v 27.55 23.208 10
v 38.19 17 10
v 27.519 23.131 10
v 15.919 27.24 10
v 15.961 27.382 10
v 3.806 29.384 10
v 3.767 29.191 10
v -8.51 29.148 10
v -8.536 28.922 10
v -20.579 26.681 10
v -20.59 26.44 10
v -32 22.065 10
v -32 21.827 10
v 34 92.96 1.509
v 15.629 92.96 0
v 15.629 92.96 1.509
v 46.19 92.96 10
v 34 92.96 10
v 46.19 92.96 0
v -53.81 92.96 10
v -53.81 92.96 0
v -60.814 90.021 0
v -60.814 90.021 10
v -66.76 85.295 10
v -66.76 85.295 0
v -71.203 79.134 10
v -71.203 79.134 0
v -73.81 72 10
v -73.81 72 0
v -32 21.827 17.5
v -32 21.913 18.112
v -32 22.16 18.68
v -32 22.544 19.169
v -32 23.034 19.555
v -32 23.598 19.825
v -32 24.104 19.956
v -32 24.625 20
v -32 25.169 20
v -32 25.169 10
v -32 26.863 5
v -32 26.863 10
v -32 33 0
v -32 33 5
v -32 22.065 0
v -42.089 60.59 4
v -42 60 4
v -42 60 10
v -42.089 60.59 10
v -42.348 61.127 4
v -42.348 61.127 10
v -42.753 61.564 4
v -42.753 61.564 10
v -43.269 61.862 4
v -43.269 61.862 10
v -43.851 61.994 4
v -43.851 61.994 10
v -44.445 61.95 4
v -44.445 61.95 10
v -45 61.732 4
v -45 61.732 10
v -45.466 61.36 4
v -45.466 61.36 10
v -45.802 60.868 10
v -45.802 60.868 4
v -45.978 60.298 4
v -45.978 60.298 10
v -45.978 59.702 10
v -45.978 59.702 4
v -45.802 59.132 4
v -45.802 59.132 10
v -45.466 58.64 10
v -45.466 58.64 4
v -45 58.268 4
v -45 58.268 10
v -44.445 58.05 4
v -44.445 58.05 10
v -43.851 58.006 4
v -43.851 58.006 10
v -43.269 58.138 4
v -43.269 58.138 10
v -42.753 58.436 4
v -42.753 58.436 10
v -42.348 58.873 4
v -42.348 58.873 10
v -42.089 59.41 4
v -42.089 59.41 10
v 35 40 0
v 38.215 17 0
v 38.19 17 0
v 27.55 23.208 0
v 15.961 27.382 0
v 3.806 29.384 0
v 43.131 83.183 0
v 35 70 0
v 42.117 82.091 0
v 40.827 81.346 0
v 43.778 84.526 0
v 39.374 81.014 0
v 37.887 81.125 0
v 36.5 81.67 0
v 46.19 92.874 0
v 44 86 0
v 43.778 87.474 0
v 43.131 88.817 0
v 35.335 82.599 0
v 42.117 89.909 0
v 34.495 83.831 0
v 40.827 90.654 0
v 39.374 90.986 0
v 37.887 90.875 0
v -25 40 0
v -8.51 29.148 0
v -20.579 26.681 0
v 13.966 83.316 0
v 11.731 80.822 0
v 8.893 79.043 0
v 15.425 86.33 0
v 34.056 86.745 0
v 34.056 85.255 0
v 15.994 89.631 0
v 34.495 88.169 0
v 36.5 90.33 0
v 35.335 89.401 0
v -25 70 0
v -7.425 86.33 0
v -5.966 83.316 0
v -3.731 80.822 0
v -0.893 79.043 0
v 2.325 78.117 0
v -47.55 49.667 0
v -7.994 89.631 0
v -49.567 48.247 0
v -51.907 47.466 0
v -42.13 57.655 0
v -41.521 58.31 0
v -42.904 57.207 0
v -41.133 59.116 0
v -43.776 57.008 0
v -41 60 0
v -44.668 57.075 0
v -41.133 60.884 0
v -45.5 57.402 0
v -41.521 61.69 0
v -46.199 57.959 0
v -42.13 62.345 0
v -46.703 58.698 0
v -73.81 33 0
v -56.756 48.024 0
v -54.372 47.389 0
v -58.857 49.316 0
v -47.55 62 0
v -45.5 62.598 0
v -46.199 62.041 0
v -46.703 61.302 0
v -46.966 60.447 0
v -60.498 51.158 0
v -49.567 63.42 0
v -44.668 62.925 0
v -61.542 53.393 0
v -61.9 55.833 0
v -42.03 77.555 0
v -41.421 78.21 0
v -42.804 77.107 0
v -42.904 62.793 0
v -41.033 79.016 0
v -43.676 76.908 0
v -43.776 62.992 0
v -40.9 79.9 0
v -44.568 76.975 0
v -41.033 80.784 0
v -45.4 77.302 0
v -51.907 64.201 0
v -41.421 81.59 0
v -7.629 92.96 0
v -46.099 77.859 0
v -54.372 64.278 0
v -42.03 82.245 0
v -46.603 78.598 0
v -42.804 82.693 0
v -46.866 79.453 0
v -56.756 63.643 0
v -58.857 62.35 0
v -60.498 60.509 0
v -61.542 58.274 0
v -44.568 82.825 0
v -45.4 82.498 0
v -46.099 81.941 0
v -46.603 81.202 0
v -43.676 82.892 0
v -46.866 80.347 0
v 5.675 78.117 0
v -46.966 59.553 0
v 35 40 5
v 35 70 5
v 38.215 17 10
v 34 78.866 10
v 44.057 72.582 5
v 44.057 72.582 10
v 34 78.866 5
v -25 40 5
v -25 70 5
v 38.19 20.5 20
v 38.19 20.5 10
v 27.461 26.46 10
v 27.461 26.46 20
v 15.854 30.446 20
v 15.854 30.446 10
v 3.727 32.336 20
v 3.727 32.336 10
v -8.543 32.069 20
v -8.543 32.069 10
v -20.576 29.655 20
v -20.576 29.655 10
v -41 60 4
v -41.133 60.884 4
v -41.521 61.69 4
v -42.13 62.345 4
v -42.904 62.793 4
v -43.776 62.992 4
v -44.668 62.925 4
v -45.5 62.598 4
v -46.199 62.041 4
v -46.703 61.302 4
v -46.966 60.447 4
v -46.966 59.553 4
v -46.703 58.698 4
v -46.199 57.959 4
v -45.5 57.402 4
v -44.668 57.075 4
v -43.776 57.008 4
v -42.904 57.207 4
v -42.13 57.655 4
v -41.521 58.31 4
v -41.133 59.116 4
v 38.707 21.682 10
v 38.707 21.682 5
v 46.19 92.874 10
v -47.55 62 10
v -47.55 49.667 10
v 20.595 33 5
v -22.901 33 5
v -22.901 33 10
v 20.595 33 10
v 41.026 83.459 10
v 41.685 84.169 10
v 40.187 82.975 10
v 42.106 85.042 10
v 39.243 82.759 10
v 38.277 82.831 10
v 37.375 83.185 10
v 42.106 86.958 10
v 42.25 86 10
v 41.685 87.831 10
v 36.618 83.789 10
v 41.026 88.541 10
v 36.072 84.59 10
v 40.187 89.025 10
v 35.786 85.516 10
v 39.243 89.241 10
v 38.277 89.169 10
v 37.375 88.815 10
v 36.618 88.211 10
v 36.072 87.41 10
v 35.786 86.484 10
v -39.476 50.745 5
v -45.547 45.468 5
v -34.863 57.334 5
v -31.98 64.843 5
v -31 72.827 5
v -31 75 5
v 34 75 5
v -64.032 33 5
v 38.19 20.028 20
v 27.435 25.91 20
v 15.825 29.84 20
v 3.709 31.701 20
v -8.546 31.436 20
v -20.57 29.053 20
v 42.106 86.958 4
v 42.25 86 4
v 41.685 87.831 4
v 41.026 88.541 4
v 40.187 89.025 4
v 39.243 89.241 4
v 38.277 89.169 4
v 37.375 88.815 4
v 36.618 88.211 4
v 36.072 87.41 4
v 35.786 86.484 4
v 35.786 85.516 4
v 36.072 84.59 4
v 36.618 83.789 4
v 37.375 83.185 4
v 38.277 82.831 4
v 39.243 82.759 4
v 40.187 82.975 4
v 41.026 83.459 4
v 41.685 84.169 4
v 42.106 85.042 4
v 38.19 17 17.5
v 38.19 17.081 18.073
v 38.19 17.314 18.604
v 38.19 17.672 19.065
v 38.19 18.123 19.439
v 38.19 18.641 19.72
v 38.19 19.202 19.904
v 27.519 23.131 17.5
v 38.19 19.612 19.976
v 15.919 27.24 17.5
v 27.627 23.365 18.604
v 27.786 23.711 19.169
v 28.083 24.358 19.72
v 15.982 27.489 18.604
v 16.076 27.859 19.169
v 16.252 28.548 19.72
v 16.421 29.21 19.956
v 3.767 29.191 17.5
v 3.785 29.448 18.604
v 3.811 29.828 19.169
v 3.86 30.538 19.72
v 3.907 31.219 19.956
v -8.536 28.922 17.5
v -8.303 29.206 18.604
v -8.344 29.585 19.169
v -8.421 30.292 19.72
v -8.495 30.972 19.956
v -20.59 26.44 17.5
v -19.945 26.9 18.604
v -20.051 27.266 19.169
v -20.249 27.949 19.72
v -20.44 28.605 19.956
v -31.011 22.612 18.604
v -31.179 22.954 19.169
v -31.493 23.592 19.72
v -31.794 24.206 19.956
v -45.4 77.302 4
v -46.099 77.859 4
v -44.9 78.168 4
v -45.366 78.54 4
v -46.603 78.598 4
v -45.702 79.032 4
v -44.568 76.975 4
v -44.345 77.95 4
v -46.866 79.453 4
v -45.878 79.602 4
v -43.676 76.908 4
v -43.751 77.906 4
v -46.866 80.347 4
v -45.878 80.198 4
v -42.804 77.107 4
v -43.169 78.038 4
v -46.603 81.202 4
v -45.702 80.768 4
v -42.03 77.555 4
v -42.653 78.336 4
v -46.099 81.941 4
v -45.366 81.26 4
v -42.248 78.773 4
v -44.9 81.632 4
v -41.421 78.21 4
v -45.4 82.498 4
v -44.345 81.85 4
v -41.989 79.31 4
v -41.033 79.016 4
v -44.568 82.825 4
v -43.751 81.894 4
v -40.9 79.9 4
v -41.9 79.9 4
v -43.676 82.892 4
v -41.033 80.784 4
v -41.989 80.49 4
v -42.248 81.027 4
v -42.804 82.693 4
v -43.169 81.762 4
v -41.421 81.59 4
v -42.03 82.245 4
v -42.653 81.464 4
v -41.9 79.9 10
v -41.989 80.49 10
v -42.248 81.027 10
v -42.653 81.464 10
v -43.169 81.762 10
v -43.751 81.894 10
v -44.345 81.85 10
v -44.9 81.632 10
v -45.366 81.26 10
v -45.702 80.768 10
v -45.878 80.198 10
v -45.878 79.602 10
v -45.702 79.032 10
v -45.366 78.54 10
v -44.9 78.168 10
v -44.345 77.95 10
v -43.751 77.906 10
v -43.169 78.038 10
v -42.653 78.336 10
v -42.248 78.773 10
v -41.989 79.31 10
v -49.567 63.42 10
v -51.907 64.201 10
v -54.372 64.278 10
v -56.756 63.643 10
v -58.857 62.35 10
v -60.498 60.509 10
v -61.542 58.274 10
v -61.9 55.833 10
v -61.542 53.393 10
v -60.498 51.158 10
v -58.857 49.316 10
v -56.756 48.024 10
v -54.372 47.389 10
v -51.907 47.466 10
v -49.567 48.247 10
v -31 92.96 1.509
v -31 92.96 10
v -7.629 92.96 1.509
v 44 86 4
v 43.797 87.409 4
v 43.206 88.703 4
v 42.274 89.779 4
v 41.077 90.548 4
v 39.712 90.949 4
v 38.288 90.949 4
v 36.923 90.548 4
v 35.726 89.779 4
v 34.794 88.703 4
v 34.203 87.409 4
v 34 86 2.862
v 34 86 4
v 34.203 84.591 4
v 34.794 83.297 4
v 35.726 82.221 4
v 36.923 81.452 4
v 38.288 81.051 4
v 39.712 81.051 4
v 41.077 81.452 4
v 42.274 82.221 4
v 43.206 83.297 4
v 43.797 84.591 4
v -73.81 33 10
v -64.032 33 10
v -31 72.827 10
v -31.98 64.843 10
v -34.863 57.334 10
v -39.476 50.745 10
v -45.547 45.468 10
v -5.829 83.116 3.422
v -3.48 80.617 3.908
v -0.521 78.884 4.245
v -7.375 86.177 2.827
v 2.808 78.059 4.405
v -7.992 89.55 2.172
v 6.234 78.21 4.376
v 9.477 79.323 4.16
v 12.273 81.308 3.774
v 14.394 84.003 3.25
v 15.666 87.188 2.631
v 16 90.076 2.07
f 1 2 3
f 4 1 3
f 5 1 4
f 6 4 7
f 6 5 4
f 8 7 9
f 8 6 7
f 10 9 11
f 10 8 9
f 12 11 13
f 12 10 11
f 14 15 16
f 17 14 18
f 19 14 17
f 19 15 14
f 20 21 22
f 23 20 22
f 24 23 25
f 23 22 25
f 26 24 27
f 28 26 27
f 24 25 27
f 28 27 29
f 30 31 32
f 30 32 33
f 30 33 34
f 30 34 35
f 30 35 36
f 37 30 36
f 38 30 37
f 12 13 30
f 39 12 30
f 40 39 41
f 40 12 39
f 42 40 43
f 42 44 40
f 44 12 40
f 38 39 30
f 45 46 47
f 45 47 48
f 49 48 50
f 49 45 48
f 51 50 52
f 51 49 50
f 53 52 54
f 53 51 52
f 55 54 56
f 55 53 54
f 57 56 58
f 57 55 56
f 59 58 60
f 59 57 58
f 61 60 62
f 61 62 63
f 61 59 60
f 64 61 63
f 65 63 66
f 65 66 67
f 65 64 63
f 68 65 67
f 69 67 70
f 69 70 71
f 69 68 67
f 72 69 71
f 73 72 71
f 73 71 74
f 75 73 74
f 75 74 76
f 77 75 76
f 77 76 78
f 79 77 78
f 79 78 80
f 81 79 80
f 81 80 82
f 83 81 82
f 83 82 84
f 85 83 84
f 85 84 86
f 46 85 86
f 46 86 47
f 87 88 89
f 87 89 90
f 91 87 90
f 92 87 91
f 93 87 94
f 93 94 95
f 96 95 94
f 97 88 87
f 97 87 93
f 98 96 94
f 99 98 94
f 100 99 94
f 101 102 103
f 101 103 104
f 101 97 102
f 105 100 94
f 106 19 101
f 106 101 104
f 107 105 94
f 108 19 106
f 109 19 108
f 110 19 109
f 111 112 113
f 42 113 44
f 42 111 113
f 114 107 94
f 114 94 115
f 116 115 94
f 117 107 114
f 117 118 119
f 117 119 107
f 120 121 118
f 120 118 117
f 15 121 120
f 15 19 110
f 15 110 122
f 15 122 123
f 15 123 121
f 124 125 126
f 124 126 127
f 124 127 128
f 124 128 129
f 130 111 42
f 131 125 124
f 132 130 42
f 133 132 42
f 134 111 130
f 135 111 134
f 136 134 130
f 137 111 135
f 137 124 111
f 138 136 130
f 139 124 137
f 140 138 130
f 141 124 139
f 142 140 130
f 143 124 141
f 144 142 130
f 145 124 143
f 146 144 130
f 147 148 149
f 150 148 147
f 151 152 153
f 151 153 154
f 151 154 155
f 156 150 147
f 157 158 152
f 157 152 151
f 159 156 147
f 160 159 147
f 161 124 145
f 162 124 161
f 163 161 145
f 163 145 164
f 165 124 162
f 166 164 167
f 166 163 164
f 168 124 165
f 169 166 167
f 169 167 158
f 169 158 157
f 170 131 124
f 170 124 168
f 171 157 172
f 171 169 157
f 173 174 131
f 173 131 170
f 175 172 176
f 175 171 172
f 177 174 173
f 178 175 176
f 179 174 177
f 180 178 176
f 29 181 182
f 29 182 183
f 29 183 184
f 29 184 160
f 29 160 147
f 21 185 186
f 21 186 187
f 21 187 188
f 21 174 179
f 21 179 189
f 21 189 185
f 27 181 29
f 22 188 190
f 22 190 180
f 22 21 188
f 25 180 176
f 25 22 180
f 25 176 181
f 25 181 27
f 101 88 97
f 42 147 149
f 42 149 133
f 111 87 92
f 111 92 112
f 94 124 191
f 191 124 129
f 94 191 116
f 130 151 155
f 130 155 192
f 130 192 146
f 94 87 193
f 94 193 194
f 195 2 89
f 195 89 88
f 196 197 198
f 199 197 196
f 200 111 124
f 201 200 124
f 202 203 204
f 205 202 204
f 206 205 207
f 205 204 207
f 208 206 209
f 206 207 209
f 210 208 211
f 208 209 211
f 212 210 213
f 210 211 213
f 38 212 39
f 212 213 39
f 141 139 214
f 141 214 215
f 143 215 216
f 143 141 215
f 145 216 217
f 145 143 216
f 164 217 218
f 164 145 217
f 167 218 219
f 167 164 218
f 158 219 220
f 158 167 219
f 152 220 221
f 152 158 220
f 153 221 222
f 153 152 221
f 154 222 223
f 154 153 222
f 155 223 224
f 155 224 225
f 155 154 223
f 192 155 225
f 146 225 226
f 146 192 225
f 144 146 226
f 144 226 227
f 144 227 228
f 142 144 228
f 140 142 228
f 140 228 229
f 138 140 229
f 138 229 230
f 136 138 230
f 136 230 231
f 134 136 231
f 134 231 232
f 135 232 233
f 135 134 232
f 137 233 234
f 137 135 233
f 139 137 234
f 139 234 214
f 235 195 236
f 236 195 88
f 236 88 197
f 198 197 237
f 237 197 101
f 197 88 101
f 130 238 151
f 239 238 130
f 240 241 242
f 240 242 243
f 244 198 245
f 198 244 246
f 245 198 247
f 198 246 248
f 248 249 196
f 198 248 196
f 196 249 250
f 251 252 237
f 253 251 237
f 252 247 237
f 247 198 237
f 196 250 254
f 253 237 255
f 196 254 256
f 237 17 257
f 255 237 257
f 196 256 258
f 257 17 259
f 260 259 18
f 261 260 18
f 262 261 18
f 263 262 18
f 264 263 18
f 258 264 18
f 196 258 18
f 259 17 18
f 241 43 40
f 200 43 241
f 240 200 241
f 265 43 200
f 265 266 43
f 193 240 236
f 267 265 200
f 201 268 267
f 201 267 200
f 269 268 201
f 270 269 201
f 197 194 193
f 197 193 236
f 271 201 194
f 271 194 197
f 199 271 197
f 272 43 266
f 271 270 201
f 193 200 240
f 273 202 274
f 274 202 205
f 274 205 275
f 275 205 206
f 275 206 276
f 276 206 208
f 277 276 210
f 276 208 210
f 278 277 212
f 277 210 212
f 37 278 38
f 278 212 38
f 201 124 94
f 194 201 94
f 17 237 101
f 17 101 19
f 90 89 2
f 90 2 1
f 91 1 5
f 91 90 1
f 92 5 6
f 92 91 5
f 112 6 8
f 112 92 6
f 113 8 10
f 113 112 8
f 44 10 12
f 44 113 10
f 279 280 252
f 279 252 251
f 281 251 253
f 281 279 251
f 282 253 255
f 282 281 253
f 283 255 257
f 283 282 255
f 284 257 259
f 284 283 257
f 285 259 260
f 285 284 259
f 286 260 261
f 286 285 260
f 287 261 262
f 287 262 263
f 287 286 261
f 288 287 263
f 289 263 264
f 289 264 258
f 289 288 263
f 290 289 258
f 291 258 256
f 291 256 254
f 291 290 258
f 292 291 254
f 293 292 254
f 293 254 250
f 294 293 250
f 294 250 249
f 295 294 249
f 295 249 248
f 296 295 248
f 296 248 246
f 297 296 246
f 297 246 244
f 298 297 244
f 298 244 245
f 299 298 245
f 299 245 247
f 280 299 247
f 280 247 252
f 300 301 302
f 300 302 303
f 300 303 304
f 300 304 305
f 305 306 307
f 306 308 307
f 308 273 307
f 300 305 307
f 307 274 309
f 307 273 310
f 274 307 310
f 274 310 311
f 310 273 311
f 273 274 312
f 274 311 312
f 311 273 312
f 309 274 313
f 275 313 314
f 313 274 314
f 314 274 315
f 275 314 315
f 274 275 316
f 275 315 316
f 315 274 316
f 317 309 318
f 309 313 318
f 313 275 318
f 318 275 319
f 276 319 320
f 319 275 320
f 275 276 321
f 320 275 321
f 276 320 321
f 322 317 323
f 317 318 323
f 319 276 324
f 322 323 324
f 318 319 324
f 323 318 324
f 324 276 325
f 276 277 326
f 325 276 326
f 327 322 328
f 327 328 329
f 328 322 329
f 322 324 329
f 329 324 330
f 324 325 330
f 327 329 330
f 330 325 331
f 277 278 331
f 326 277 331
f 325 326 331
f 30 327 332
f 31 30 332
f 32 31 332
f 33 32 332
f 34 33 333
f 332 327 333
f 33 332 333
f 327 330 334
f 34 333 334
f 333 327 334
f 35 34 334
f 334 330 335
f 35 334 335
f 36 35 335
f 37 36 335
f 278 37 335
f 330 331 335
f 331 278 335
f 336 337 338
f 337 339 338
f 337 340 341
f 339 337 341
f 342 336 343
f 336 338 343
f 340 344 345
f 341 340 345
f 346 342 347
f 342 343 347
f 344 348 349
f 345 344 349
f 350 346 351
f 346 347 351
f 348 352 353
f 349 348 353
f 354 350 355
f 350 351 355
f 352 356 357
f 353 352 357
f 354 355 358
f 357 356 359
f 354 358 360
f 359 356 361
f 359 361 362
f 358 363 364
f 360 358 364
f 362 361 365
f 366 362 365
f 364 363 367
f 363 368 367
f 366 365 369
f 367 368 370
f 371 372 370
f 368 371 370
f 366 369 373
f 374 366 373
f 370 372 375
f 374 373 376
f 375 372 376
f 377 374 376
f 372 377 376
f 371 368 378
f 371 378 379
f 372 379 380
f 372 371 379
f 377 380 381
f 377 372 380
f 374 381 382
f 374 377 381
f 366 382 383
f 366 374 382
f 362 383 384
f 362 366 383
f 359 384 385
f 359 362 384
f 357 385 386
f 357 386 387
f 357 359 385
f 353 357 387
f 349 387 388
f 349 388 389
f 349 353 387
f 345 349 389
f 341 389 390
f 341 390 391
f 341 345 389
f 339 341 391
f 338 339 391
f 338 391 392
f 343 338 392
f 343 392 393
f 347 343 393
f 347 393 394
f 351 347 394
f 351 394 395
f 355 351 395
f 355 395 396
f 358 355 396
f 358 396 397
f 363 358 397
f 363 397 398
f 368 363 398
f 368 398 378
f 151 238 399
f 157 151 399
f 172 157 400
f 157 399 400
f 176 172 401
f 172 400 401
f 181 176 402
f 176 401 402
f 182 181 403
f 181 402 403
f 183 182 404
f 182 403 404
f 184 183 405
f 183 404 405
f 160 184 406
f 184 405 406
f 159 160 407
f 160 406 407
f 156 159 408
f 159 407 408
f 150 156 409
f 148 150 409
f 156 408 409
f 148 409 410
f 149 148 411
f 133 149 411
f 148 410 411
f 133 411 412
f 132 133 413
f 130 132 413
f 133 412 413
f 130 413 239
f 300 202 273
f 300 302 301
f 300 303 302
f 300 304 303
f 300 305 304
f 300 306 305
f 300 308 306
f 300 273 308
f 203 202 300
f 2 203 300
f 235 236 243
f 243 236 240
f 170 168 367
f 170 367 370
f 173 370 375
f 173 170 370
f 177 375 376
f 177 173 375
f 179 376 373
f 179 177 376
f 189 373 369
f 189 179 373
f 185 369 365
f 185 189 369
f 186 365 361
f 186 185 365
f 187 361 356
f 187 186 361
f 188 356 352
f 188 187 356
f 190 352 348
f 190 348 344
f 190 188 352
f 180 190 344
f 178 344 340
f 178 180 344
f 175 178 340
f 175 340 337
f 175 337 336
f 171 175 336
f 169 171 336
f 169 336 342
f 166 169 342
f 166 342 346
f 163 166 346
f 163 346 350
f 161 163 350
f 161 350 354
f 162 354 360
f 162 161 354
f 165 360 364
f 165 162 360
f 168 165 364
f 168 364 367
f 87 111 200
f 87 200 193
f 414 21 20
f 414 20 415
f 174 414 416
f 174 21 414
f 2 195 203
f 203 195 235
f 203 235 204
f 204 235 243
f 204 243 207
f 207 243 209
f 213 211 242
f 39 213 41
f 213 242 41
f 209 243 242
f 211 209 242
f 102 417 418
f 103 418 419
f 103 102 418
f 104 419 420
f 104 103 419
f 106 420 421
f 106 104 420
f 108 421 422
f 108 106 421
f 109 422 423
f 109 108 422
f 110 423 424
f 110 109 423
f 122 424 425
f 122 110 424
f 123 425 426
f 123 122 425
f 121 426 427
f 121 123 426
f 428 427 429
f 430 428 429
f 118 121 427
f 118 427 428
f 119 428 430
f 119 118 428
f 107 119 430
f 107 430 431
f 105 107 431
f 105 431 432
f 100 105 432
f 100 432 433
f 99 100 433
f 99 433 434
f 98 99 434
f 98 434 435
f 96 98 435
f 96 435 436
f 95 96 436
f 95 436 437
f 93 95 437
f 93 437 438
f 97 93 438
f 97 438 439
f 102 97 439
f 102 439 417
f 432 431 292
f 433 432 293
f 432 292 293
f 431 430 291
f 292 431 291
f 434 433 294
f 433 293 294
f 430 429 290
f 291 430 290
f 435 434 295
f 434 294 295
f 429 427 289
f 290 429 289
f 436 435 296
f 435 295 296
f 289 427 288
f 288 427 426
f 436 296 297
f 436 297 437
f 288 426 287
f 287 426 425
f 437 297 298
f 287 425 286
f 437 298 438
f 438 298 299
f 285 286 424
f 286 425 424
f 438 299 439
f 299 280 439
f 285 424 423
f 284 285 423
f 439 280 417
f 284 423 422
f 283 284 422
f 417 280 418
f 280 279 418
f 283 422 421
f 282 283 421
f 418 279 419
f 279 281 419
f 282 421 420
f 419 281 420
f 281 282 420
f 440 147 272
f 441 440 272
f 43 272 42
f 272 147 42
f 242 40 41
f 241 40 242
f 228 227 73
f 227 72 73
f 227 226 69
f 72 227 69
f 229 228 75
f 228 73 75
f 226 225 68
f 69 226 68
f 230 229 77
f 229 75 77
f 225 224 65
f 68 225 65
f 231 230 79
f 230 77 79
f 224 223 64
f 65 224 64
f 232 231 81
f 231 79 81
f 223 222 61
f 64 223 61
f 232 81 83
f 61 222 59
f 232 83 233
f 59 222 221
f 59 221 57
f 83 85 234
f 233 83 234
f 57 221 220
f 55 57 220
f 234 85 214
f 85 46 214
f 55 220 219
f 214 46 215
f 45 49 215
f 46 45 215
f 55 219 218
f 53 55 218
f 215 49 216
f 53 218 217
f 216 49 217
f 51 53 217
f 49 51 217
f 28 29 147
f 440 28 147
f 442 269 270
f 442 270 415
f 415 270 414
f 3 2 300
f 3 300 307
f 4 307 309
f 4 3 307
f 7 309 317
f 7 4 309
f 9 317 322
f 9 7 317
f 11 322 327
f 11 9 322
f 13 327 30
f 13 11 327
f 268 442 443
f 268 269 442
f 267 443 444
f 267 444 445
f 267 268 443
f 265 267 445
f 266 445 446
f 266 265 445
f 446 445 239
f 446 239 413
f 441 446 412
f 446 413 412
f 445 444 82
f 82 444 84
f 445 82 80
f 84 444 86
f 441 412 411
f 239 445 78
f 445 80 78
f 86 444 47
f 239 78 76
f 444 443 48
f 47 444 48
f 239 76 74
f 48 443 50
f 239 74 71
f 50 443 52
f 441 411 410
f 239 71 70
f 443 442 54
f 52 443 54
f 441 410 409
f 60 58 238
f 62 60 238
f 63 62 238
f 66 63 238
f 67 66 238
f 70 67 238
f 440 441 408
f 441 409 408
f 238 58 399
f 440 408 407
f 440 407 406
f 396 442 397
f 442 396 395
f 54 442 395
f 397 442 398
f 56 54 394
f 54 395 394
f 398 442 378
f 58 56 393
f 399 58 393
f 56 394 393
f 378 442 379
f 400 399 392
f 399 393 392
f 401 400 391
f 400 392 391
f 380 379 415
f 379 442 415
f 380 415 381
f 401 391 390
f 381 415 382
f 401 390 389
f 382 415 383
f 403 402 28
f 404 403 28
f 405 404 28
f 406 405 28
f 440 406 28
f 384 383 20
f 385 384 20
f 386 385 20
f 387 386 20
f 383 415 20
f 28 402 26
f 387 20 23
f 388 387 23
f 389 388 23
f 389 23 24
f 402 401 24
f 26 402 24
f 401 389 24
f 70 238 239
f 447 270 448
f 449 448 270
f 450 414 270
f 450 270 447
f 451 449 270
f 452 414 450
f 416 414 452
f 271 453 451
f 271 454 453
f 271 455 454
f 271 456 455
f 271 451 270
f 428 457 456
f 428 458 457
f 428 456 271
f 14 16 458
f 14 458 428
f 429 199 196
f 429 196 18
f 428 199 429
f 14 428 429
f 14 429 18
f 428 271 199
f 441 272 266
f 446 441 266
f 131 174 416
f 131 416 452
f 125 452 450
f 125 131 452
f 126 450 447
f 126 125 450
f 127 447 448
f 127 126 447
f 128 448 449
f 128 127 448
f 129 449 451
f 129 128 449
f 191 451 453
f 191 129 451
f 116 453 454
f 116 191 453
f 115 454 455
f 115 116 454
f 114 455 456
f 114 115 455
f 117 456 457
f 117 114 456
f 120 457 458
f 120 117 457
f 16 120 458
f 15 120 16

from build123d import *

# Parameters (mm, degrees)
PAD002_DEPTH      = 10
PAD003_DEPTH      = 10
FILLET_R          = 2.5
BOX013_W          = 42
BOX013_H          = 20
BOX013_DEPTH      = 20
CYLINDER009_R     = 12
CYLINDER009_DEPTH = 10
CYLINDER010_R     = 5
CYLINDER010_DEPTH = 4
CYLINDER011_R     = 3.25
CYLINDER011_DEPTH = 10
CYLINDER012_R     = 2
CYLINDER012_DEPTH = 10
CYLINDER013_R     = 2
CYLINDER013_DEPTH = 10
CYLINDER014_R     = 3
CYLINDER014_DEPTH = 4
CYLINDER015_R     = 3
CYLINDER015_DEPTH = 4
BOX014_W          = 83
BOX014_H          = 10
BOX014_DEPTH      = 10
BOX015_W          = 60
BOX015_H          = 30
BOX015_DEPTH      = 10
BOX016_W          = 65
BOX016_H          = 62
BOX016_DEPTH      = 10
BOX017_W          = 47
BOX017_H          = 23
BOX017_DEPTH      = 5
BOX018_W          = 46
BOX018_H          = 40
BOX018_DEPTH      = 5
BOX019_W          = 65
BOX019_H          = 22
BOX019_DEPTH      = 10
FILLET001_R       = 33
POCKET_DEPTH      = 10


with BuildPart() as part:
    # Sketch012 → Pad002 (new body)
    with BuildSketch(Plane.XY):
        with BuildLine():
            Line((-53.81, 92.96), (46.19, 92.96))
            Line((46.19, 17), (46.19, 92.96))
            Line((38.19, 17), (46.19, 17))
            ThreePointArc((38.19, 17), (-1.06, 29.559572), (-40.31, 17))
            Line((-73.81, 17), (-40.31, 17))
            Line((-73.81, 72), (-73.81, 17))
            ThreePointArc((-53.81, 92.96), (-66.759872, 85.294763), (-73.81, 72))
        make_face()
    extrude(amount=PAD002_DEPTH)

    # Sketch013 (on Face9 of Pad002) → Pad003 (join)
    with BuildSketch(Plane.XY.offset(10)):
        with BuildLine():
            ThreePointArc((38.19, 17), (-0.906062, 29.351664), (-40, 16.993281))
            Line((-40, 20.493281), (-40, 16.993281))
            ThreePointArc((38.19, 20.5), (-0.906031, 32.489323), (-40, 20.493281))
            Line((38.19, 20.5), (38.19, 17))
        make_face()
    extrude(amount=PAD003_DEPTH)

    # Fillet
    fillet_edges = [part.edges().sort_by_distance(p)[0] for p in [
        (-0.906062, 29.351664, 20),
    ]]
    fillet(fillet_edges, radius=FILLET_R)

    # Box013 → Box013 (cut)
    with BuildSketch(Plane(origin=(-74, 13, 0), x_dir=(1, 0, 0), z_dir=(0, 0, 1))):
        with Locations((21, 10)):
            Rectangle(BOX013_W, BOX013_H)
    extrude(amount=BOX013_DEPTH, mode=Mode.SUBTRACT)

    # Cylinder009 → Cylinder009 (cut)
    with BuildSketch(Plane(origin=(4, 90, 0), x_dir=(1, 0, 0), z_dir=(0, 0, 1))):
        Circle(CYLINDER009_R)
    extrude(amount=CYLINDER009_DEPTH, mode=Mode.SUBTRACT)

    # Cylinder010 → Cylinder010 (cut)
    with BuildSketch(Plane(origin=(39, 86, 0), x_dir=(1, 0, 0), z_dir=(0, 0, 1))):
        Circle(CYLINDER010_R)
    extrude(amount=CYLINDER010_DEPTH, mode=Mode.SUBTRACT)

    # Cylinder011 → Cylinder011 (cut)
    with BuildSketch(Plane(origin=(39, 86, 0), x_dir=(1, 0, 0), z_dir=(0, 0, 1))):
        Circle(CYLINDER011_R)
    extrude(amount=CYLINDER011_DEPTH, mode=Mode.SUBTRACT)

    # Cylinder012 → Cylinder012 (cut)
    with BuildSketch(Plane(origin=(-43.9, 79.9, 0), x_dir=(1, 0, 0), z_dir=(0, 0, 1))):
        Circle(CYLINDER012_R)
    extrude(amount=CYLINDER012_DEPTH, mode=Mode.SUBTRACT)

    # Cylinder013 → Cylinder013 (cut)
    with BuildSketch(Plane(origin=(-44, 60, 0), x_dir=(1, 0, 0), z_dir=(0, 0, 1))):
        Circle(CYLINDER013_R)
    extrude(amount=CYLINDER013_DEPTH, mode=Mode.SUBTRACT)

    # Cylinder014 → Cylinder014 (cut)
    with BuildSketch(Plane(origin=(-43.9, 79.9, 0), x_dir=(1, 0, 0), z_dir=(0, 0, 1))):
        Circle(CYLINDER014_R)
    extrude(amount=CYLINDER014_DEPTH, mode=Mode.SUBTRACT)

    # Cylinder015 → Cylinder015 (cut)
    with BuildSketch(Plane(origin=(-44, 60, 0), x_dir=(1, 0, 0), z_dir=(0, 0, 1))):
        Circle(CYLINDER015_R)
    extrude(amount=CYLINDER015_DEPTH, mode=Mode.SUBTRACT)

    # Box014 → Box014 (cut)
    with BuildSketch(Plane(origin=(47.85, 13, 0), x_dir=(0.104528, 0.994522, 0), z_dir=(0, 0, 1))):
        with Locations((41.5, 5)):
            Rectangle(BOX014_W, BOX014_H)
    extrude(amount=BOX014_DEPTH, mode=Mode.SUBTRACT)

    # Box015 → Box015 (cut)
    with BuildSketch(Plane(origin=(-25, 40, 0), x_dir=(1, 0, 0), z_dir=(0, 0, 1))):
        with Locations((30, 15)):
            Rectangle(BOX015_W, BOX015_H)
    extrude(amount=BOX015_DEPTH, mode=Mode.SUBTRACT)

    # Box016 → Box016 (cut)
    with BuildSketch(Plane(origin=(-31, 33, 5), x_dir=(1, 0, 0), z_dir=(0, 0, 1))):
        with Locations((32.5, 31)):
            Rectangle(BOX016_W, BOX016_H)
    extrude(amount=BOX016_DEPTH, mode=Mode.SUBTRACT)

    # Box017 → Box017 (cut)
    with BuildSketch(Plane(origin=(-57, 10, 5), x_dir=(0.829038, 0.559193, 0), z_dir=(0, 0, 1))):
        with Locations((23.5, 11.5)):
            Rectangle(BOX017_W, BOX017_H)
    extrude(amount=BOX017_DEPTH, mode=Mode.SUBTRACT)

    # Box018 → Box018 (cut)
    with BuildSketch(Plane(origin=(43, 19, 5), x_dir=(0.529919, 0.848048, 0), z_dir=(0, 0, 1))):
        with Locations((23, 20)):
            Rectangle(BOX018_W, BOX018_H)
    extrude(amount=BOX018_DEPTH, mode=Mode.SUBTRACT)

    # Box019 → Box019 (cut)
    with BuildSketch(Plane(origin=(-31, 75, 5), x_dir=(1, 0, 0), z_dir=(0, 0.190809, 0.981627))):
        with Locations((32.5, 11)):
            Rectangle(BOX019_W, BOX019_H)
    extrude(amount=BOX019_DEPTH, mode=Mode.SUBTRACT)

    # Fillet001
    fillet001_edges = [part.edges().sort_by_distance(p)[0] for p in [
        (-31, 55.280234, 7.5),
    ]]
    fillet(fillet001_edges, radius=FILLET001_R)

    # Sketch015 (on Face8 of Fillet001) → Pocket (cut)
    with BuildSketch(Plane(origin=(-31, 75, 10), x_dir=(1, 0, 0), z_dir=(0, 0, 1))):
        with BuildLine():
            ThreePointArc((-16.55, -13), (-30.9, -19.166644), (-16.55, -25.333288))
            Line((-16.55, -13), (-16.55, -25.333288))
        make_face()
    extrude(amount=-POCKET_DEPTH, mode=Mode.SUBTRACT)


solid = part.part
